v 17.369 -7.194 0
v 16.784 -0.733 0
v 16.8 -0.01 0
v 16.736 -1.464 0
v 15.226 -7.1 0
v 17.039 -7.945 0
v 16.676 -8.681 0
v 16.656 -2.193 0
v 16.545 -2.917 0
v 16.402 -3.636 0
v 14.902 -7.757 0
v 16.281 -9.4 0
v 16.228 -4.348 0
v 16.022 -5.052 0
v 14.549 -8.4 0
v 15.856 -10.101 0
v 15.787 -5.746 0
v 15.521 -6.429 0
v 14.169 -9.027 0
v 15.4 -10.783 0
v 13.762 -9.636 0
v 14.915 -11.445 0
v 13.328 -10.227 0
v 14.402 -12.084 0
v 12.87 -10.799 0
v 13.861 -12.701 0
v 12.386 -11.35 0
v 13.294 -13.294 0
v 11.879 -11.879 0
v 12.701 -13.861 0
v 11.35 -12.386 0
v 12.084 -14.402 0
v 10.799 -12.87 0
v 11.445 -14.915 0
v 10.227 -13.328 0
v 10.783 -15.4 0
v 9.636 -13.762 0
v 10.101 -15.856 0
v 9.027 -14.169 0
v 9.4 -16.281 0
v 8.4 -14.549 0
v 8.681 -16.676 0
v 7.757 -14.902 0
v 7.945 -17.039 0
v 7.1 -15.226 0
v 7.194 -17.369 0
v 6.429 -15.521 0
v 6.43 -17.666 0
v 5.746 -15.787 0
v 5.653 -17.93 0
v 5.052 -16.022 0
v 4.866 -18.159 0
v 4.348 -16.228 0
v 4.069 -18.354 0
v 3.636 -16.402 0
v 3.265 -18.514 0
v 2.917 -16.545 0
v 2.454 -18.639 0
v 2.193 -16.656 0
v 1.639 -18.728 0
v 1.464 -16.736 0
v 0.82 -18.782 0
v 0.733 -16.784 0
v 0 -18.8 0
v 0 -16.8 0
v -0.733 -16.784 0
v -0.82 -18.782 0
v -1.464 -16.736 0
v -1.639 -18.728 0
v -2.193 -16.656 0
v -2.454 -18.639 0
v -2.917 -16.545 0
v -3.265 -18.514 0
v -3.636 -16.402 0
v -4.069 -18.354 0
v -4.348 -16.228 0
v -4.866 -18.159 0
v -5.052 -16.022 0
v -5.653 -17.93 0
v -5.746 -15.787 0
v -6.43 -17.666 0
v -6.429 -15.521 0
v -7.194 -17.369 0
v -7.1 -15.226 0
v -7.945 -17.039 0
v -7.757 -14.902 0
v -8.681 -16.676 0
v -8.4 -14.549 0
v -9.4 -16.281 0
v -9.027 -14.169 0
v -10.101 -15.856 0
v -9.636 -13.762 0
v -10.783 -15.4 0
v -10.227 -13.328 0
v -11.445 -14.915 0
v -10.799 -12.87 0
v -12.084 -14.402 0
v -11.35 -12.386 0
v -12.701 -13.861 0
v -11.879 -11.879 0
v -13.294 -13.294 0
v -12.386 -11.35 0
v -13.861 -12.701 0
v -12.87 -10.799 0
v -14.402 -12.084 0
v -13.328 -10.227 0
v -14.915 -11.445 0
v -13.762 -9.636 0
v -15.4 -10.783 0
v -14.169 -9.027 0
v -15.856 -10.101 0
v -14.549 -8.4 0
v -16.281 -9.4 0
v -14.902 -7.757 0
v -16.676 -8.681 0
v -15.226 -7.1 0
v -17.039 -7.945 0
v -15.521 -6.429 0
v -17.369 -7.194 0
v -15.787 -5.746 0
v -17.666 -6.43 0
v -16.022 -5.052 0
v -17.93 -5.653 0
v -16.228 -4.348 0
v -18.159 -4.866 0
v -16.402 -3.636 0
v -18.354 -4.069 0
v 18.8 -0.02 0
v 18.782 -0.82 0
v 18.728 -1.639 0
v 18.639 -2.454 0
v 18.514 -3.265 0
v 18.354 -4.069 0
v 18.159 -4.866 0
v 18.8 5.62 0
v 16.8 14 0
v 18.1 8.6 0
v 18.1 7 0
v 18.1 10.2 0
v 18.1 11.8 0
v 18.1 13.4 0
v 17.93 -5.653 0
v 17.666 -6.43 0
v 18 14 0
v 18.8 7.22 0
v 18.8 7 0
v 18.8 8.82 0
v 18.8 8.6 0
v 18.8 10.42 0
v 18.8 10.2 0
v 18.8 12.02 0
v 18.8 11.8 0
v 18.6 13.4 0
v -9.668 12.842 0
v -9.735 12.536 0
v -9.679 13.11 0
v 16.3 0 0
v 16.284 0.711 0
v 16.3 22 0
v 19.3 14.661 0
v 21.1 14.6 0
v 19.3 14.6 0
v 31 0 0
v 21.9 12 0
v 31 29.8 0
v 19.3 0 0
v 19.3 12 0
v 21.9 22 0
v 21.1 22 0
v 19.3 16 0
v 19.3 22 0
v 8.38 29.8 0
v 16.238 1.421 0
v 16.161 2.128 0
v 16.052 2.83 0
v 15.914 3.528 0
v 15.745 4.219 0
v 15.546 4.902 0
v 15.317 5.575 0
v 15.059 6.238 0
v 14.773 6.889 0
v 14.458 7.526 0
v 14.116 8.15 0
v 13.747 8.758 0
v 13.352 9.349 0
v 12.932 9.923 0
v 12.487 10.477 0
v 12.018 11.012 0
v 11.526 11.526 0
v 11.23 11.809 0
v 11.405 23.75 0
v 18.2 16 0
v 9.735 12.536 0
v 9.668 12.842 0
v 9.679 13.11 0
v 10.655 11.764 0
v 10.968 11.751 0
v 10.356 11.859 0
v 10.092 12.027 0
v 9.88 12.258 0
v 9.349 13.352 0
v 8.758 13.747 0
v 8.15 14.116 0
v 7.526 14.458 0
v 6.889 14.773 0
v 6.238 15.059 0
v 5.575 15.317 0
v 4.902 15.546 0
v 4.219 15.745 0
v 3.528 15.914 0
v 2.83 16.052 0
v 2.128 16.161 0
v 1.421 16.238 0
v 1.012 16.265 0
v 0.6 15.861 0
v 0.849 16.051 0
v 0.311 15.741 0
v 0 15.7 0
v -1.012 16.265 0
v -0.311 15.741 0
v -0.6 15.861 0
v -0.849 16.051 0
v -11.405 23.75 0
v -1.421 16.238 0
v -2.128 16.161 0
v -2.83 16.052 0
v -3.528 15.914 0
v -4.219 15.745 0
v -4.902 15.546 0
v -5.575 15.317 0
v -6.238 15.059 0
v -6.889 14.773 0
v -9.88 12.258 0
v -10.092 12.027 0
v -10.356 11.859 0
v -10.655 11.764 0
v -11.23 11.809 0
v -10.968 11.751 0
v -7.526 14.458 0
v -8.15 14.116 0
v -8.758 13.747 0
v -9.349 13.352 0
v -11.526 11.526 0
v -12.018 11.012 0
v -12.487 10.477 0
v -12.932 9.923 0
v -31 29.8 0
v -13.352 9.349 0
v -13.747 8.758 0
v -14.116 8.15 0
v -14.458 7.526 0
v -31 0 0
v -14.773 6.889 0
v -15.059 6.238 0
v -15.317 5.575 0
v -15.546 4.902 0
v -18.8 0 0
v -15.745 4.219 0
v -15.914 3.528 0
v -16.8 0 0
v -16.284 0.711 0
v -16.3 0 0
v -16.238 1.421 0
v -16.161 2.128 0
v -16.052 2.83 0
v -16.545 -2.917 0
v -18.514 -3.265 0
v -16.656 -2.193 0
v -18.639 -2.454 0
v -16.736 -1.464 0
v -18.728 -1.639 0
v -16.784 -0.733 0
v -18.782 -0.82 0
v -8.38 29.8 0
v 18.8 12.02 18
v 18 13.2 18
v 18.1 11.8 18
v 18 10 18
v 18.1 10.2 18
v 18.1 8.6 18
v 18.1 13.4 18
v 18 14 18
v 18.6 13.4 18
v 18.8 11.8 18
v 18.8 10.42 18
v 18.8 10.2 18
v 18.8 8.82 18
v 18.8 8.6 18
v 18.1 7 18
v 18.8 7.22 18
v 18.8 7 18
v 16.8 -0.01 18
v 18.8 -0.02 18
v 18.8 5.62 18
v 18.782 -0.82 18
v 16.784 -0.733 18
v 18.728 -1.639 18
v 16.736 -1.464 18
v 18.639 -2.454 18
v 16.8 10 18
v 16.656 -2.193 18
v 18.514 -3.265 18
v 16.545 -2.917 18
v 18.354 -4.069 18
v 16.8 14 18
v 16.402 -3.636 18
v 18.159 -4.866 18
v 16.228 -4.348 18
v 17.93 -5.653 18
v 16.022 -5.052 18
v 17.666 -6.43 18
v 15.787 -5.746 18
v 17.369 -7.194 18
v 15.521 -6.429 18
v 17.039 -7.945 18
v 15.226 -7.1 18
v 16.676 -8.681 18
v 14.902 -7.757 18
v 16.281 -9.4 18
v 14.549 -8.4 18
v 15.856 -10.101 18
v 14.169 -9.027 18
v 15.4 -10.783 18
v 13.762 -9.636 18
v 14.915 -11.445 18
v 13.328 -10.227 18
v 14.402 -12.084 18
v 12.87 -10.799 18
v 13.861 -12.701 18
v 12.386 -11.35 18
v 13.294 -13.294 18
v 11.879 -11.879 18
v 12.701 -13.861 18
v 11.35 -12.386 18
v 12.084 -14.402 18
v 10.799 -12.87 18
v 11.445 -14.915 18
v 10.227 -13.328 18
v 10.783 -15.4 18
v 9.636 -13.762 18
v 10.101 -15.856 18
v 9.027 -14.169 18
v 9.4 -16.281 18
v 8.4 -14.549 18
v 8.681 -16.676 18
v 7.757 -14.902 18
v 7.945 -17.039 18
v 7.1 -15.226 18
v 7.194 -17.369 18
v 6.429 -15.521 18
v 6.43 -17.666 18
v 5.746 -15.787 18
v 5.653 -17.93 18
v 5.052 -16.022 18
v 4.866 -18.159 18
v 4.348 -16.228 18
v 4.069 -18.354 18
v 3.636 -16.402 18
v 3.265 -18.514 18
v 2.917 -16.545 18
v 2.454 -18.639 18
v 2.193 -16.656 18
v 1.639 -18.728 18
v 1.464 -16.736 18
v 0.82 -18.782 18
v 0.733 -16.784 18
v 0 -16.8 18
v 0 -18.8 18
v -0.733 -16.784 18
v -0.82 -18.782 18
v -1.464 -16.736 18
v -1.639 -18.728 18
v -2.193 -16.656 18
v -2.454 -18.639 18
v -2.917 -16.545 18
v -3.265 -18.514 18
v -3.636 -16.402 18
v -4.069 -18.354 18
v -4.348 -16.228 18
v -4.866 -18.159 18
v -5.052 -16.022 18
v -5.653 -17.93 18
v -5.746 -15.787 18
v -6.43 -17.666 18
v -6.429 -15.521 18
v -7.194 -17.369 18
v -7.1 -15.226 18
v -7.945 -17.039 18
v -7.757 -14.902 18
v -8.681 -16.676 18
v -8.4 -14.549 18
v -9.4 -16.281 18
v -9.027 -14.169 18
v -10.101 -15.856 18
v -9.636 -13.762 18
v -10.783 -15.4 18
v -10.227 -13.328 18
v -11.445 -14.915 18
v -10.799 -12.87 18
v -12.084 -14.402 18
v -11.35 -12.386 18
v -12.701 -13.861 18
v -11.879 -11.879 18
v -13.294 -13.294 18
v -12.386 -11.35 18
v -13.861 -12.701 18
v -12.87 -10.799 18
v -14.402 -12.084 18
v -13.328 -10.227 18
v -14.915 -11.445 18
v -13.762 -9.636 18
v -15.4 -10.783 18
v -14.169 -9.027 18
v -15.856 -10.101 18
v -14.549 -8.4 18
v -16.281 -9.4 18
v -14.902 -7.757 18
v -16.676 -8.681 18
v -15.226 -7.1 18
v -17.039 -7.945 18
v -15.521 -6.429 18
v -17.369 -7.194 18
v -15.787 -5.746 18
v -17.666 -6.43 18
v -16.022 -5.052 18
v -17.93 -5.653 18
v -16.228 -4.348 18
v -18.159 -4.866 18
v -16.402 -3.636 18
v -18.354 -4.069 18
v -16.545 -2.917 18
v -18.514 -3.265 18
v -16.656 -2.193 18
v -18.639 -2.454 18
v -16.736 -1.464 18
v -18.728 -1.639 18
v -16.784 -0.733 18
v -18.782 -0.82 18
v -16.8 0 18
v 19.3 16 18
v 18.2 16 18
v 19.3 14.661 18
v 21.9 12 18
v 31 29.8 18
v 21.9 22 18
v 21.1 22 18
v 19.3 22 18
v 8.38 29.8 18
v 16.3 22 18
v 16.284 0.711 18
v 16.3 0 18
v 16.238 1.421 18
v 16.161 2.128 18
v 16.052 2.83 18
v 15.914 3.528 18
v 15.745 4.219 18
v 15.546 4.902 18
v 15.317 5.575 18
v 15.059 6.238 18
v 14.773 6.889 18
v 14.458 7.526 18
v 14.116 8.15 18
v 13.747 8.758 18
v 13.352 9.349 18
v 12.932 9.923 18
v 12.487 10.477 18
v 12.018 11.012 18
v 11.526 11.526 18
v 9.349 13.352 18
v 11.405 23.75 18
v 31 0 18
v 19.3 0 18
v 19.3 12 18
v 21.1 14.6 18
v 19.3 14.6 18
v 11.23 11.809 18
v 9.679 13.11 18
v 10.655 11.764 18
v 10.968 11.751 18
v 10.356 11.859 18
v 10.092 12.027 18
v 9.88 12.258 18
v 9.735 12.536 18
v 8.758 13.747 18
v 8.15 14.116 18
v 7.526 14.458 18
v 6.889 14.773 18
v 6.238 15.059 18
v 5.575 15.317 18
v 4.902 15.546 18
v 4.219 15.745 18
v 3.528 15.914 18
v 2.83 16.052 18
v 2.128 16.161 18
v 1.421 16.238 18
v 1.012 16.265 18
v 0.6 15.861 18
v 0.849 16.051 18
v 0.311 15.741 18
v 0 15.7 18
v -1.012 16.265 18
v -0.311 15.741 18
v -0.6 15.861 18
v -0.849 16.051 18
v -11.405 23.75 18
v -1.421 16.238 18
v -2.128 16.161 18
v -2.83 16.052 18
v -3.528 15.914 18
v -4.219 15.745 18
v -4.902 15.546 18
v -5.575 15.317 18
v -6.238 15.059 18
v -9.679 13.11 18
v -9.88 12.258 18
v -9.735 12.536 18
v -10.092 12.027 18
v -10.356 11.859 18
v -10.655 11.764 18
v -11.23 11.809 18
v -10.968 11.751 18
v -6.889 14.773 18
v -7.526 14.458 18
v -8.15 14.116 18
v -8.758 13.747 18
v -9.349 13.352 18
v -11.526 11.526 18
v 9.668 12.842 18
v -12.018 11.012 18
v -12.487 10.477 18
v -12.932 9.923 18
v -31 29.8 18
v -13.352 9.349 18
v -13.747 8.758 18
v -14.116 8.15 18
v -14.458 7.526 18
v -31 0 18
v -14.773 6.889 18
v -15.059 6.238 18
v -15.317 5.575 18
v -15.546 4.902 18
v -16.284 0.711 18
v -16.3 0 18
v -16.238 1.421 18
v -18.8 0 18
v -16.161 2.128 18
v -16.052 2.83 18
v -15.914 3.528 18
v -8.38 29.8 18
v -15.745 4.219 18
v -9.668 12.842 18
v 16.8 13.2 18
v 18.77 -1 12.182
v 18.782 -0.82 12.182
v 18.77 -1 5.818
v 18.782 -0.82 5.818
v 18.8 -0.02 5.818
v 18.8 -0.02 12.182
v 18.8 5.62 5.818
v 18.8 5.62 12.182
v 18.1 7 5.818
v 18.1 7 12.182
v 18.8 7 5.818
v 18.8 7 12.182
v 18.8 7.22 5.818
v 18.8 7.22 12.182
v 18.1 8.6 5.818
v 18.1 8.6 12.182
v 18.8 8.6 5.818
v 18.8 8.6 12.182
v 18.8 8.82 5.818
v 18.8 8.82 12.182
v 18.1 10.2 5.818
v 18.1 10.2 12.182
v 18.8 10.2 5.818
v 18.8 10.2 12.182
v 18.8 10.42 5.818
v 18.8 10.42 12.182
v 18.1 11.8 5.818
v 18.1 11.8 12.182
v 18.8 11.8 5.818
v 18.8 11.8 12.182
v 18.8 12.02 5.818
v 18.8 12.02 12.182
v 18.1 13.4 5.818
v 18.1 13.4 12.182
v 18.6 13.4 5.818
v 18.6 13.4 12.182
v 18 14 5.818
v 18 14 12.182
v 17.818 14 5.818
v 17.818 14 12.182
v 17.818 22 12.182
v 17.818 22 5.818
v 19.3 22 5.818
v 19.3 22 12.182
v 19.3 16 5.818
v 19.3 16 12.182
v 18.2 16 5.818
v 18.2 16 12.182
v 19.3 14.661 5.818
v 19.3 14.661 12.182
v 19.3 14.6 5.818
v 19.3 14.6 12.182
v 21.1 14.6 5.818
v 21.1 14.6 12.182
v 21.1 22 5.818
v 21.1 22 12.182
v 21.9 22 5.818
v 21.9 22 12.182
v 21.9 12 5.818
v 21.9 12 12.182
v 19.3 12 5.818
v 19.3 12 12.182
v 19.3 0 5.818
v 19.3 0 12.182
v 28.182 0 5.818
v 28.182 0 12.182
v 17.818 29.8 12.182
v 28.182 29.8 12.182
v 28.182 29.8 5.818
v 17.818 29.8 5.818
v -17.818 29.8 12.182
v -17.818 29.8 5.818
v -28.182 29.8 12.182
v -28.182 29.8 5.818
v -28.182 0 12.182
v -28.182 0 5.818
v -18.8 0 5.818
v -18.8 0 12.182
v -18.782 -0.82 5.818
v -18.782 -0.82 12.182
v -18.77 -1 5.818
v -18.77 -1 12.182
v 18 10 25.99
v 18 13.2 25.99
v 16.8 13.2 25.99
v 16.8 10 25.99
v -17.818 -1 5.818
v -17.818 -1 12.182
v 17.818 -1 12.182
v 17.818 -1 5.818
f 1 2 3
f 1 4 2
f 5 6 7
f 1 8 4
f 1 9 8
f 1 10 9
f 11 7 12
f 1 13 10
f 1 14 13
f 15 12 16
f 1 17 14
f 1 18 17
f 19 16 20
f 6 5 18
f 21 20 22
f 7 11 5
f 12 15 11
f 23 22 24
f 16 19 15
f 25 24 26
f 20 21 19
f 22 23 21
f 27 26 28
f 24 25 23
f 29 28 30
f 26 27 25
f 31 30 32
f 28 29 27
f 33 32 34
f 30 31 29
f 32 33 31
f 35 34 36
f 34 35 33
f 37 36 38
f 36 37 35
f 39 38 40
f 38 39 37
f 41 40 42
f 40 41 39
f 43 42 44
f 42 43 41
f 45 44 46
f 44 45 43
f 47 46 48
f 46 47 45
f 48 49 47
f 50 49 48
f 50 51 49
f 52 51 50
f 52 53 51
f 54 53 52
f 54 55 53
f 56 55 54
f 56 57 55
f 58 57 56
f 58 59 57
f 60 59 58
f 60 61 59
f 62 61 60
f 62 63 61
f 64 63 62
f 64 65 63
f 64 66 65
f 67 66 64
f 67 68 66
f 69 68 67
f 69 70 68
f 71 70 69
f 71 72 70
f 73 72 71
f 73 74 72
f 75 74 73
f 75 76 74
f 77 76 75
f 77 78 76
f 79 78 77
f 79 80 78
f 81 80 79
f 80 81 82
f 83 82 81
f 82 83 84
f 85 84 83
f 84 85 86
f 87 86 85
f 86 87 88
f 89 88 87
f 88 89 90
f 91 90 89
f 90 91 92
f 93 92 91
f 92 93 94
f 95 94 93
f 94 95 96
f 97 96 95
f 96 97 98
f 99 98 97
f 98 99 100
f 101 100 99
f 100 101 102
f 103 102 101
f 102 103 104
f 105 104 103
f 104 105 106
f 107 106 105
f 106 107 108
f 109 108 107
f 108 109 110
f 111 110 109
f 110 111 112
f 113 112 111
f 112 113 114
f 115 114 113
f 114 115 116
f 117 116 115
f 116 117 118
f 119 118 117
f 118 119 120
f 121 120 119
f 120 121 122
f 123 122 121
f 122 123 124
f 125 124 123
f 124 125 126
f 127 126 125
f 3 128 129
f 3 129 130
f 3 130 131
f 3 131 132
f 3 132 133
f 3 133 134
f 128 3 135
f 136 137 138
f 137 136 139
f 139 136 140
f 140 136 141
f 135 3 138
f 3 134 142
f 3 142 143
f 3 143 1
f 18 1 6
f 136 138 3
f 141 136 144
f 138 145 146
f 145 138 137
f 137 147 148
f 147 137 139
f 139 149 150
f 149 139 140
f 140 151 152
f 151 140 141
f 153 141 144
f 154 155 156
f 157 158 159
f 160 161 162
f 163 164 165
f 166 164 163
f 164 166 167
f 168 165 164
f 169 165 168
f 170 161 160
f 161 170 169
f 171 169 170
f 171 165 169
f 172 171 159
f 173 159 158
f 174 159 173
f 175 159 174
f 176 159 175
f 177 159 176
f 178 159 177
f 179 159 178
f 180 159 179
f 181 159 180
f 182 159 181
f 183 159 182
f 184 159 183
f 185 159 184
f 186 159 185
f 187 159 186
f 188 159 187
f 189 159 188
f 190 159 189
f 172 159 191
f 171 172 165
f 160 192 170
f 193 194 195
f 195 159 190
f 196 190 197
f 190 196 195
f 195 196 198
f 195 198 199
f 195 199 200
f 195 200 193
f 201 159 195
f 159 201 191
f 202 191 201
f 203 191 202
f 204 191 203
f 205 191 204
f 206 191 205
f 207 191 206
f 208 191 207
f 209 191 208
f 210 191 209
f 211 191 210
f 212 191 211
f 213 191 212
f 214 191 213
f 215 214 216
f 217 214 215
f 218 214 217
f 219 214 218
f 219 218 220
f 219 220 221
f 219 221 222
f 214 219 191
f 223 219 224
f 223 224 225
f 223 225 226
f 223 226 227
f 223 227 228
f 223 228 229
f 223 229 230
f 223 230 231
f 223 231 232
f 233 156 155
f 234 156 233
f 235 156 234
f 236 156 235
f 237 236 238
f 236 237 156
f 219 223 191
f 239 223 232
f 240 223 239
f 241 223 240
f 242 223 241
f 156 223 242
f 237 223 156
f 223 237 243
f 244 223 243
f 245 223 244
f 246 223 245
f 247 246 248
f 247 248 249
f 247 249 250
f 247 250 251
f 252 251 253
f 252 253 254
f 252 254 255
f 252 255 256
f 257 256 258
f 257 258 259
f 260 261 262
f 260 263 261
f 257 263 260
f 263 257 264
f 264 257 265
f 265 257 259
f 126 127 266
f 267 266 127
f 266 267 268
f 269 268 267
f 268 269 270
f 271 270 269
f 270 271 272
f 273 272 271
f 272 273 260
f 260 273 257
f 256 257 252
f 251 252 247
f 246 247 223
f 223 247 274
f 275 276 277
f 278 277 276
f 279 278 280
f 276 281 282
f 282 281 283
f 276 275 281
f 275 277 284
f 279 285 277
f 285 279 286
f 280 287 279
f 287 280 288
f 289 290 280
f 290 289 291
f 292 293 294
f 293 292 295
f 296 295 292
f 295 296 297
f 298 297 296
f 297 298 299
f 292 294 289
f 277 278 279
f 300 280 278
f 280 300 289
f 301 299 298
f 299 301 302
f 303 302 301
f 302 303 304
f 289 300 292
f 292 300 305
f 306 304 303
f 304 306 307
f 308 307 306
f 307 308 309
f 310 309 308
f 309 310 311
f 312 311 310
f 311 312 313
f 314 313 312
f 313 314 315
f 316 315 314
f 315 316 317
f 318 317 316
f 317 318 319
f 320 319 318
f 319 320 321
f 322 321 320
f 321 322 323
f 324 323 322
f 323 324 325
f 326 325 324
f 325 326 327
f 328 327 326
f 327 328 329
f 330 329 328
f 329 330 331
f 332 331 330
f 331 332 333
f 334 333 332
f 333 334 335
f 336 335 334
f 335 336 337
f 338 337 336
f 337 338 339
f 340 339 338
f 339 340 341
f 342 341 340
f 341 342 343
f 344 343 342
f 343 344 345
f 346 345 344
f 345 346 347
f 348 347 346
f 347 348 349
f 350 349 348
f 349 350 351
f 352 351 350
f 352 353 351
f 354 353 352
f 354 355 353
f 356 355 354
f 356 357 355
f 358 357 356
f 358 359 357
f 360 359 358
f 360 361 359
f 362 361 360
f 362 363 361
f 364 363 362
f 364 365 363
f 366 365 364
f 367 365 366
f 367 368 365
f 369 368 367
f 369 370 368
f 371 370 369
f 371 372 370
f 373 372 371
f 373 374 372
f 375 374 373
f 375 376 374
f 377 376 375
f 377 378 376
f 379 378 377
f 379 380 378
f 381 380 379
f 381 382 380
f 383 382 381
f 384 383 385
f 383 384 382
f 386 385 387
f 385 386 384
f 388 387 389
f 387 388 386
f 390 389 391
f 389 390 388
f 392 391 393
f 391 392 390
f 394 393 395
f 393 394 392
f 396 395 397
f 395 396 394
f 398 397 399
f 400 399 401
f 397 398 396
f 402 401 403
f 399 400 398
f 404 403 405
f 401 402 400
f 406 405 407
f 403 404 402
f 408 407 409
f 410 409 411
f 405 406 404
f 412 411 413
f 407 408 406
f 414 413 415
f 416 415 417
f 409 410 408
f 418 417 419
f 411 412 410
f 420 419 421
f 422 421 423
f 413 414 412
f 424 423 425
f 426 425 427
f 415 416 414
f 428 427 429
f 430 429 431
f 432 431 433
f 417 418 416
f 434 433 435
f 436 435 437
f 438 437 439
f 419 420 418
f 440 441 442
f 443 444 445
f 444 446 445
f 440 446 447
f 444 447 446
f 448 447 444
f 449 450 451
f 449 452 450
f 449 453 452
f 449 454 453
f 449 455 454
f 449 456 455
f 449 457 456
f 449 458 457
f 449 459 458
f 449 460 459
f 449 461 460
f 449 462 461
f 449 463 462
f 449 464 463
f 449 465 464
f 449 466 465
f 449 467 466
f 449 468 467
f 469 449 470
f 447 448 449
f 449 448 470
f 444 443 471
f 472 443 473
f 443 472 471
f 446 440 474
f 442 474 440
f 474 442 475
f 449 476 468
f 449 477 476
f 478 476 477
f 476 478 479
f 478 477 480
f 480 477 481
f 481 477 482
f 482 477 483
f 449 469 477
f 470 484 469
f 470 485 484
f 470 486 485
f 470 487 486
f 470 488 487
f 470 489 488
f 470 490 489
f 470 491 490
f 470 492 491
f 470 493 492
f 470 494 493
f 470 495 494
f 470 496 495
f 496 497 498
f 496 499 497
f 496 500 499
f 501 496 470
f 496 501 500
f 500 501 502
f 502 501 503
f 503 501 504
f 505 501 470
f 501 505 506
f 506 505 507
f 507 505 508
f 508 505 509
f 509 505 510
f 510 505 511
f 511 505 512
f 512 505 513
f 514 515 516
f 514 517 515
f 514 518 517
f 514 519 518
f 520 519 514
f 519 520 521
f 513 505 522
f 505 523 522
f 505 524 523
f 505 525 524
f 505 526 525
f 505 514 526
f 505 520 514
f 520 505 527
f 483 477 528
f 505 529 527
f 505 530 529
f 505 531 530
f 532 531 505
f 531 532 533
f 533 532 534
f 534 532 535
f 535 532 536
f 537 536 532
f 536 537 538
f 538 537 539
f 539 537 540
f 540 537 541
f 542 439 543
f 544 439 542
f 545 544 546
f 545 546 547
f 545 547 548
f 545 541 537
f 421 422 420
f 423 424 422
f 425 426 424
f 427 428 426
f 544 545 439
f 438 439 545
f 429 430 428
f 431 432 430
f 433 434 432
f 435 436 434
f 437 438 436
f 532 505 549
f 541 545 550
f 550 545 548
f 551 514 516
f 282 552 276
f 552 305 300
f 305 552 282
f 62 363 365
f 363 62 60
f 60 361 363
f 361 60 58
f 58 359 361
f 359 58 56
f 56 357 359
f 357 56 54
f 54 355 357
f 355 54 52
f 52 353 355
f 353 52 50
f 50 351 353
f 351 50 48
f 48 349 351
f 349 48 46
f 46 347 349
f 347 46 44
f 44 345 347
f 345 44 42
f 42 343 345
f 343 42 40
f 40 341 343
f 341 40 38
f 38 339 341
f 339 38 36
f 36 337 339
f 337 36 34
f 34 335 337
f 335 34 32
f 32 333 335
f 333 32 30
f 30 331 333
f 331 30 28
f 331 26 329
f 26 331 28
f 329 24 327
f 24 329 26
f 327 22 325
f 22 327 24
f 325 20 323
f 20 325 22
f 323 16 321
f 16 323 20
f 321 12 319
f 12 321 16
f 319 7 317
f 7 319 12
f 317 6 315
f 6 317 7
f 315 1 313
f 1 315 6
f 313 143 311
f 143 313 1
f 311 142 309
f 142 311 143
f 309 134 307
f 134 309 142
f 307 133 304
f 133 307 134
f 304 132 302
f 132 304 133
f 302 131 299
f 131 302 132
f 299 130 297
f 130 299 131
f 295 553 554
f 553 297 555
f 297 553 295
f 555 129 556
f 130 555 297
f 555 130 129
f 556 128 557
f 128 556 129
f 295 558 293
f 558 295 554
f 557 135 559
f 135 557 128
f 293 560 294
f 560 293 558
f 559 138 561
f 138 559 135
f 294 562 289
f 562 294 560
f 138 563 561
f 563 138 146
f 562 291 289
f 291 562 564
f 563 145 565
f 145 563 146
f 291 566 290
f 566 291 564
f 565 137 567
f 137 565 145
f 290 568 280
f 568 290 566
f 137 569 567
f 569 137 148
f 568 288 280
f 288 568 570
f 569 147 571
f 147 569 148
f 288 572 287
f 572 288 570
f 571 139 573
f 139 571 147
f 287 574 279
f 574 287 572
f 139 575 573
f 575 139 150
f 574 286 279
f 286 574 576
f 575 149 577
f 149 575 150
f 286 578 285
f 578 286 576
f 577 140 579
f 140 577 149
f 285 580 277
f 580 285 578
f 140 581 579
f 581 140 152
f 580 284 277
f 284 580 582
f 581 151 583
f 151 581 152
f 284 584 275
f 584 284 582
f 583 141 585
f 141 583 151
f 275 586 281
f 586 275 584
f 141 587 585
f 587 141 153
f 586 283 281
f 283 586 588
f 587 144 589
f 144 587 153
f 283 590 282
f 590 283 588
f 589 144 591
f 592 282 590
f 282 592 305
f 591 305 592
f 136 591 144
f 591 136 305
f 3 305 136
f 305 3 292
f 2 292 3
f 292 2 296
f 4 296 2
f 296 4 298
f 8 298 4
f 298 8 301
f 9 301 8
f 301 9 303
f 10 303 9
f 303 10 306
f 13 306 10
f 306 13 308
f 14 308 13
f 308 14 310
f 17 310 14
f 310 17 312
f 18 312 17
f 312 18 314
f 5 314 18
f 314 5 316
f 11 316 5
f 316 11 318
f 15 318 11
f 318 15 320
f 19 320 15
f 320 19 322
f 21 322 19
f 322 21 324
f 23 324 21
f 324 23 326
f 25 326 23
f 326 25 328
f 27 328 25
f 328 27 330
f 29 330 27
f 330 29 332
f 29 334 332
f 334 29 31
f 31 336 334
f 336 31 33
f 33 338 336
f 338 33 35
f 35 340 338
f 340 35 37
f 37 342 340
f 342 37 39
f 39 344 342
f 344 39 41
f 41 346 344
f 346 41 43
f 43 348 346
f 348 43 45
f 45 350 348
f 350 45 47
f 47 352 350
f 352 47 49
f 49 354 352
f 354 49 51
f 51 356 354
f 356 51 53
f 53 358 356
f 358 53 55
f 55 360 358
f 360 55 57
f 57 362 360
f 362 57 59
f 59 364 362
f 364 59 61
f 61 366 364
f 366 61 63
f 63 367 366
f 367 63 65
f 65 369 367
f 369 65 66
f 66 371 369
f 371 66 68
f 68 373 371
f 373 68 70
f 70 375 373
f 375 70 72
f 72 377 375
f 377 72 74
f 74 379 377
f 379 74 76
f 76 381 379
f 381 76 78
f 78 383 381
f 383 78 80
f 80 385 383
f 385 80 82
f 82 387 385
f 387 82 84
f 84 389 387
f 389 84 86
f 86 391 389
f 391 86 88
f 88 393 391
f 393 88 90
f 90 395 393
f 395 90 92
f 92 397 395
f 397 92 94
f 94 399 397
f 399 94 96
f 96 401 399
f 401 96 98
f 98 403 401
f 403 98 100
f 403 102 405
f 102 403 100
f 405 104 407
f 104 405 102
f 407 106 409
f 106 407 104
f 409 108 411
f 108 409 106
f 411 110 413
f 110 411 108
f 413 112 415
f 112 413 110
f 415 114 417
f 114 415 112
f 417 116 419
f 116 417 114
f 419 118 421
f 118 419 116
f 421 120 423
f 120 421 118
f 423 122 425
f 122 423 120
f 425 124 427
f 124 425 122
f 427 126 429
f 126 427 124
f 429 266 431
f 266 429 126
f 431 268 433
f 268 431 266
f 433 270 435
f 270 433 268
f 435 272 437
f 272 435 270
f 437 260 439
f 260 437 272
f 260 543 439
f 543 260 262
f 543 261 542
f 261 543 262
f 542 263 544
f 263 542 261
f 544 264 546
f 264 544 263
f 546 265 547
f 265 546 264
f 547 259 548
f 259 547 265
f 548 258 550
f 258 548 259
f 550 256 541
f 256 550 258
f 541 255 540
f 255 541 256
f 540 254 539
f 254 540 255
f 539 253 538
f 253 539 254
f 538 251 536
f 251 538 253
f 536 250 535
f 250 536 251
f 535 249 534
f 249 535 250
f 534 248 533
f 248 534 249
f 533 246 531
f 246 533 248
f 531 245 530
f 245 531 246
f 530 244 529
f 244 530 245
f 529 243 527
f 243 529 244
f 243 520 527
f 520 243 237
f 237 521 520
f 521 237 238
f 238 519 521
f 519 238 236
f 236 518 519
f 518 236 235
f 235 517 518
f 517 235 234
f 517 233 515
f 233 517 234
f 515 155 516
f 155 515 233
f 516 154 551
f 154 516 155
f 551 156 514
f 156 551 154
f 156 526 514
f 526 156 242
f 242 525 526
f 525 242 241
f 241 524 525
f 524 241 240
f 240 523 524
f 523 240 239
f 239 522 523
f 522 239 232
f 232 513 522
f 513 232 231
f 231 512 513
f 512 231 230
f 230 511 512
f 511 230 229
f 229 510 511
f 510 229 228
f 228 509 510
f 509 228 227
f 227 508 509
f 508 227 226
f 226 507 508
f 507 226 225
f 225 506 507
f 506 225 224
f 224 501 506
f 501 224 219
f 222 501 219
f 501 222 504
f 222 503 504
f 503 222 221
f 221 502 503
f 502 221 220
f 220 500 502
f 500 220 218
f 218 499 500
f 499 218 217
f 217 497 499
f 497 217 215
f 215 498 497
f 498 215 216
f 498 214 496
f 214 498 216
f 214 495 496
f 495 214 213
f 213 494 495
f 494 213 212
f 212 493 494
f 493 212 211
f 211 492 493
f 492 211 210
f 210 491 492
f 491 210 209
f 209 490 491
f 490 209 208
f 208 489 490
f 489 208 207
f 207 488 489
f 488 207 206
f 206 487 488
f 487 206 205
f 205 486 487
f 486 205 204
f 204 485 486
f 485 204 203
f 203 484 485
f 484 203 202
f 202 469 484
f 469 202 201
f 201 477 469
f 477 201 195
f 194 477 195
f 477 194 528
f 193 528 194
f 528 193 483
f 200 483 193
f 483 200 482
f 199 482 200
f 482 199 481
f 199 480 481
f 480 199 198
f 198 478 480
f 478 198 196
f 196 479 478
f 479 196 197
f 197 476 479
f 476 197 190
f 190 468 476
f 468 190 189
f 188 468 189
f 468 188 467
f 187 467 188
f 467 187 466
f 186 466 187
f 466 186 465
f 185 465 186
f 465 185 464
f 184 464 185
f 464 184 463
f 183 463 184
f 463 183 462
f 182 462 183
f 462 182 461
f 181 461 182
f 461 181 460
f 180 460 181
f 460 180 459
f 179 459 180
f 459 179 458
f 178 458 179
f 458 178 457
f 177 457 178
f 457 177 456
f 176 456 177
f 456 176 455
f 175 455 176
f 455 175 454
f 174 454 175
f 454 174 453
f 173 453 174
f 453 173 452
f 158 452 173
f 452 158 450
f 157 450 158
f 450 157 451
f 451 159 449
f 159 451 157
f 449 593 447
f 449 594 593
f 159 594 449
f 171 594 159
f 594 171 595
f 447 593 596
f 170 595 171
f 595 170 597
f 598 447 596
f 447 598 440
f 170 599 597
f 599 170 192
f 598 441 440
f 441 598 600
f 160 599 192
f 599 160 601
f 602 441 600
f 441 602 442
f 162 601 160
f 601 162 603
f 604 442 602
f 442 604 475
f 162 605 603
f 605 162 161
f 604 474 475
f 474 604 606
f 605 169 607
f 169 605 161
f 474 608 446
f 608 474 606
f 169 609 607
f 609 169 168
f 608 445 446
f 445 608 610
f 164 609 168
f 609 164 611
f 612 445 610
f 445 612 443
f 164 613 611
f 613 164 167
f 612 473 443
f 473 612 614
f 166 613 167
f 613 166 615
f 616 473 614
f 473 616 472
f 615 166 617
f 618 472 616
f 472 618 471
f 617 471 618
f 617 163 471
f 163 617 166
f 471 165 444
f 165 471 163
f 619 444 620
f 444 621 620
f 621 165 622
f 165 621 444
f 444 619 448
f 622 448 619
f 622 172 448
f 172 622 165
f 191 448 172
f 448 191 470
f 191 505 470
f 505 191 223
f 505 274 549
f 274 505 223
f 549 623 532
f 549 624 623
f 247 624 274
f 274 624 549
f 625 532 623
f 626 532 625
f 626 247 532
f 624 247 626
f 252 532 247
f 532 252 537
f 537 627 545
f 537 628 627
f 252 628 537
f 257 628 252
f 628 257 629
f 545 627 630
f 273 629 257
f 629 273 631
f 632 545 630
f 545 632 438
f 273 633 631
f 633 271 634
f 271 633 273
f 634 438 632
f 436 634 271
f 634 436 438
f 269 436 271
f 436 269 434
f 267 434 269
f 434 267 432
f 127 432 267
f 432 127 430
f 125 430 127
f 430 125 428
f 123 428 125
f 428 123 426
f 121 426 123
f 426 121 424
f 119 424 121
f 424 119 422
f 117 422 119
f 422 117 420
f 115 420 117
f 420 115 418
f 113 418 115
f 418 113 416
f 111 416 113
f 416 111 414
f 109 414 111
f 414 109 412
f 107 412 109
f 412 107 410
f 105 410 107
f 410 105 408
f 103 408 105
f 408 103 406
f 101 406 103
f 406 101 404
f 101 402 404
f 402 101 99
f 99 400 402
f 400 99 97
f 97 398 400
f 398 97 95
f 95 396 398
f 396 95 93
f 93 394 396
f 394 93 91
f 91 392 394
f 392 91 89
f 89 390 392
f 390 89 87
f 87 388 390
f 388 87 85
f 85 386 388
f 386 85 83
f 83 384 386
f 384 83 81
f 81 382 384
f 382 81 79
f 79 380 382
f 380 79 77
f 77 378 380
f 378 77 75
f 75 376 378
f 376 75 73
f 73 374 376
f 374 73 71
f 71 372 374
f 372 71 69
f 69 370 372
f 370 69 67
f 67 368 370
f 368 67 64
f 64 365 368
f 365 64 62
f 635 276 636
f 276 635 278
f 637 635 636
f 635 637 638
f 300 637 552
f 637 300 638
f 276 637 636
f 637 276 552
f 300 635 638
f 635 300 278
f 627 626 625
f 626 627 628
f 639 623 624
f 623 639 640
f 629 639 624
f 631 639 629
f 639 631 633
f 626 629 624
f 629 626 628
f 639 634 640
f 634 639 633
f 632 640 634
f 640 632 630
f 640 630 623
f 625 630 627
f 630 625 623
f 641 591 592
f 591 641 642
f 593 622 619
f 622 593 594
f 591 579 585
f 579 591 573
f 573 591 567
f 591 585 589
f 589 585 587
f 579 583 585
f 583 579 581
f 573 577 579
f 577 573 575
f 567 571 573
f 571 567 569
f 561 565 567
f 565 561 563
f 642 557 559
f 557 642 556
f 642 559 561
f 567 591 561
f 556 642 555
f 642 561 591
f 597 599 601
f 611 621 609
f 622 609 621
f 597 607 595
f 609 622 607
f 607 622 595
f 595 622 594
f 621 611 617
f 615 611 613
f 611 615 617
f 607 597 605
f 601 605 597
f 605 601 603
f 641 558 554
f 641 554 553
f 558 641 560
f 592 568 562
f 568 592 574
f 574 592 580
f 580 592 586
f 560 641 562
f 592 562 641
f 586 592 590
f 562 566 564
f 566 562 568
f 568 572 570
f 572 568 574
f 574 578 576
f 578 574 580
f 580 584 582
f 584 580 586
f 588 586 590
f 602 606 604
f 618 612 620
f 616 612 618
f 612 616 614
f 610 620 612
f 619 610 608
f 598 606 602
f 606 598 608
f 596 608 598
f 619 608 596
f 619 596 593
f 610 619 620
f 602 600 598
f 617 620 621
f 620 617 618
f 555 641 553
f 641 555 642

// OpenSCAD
// file: common.scad
// Shared dimensions in mm; FDM fit allowances are design choices, not tolerances
// guaranteed by vendors. Exact mower model/serial and printer remain unknown.
// 76.2 x 38.1 rectangular rail is an UNVERIFIED selected envelope, not a
// specification for all TimeCutters (Toro also sells C-channel frames).
$fn = 64;
frame_rail_w = 76.2;                // depth wrapped by square U-bolt
frame_rail_h = 38.1;                // contact face width between U-bolt legs
frame_ubolt_inside_w = 40;
frame_ubolt_leg_nominal_d = 8;
frame_ubolt_center_pitch = frame_ubolt_inside_w + frame_ubolt_leg_nominal_d;
frame_ubolt_leg_hole_d = 9;
frame_ubolt_backing_t = 3;
frame_ubolt_washer_t = 2.4;
frame_ubolt_nut_h = 8;
frame_ubolt_thread_projection = 3;  // beyond full nut, not a second nut engagement
// Four-bolt printed steering-bar clamp. The bar size is set by the sleeve set below, so nothing
// here needs a caliper reading; see clamp_bar_od_mm.
clamp_tube_clearance_mm = 0.4;
clamp_shell_mm = 10;
clamp_bolt_x_mm = 18;
clamp_bolt_clear_mm = 5.5;          // four M5 clamp bolts
clamp_nut_af_mm = 8.2;
clamp_nut_depth_mm = 4.8;
clamp_pin_bore_mm = 6.6;
clamp_rod_eye_length_mm = 32;
clamp_rod_eye_width_mm = 20;
clamp_rod_eye_t_mm = 8;             // printed single-eye lug thickness
clamp_rod_gap_mm = 9;               // yoke clearance around the eye, nominally 0.5 mm per side
clamp_yoke_span_mm = 42;            // ear width clears the eye through its planar sweep
clamp_yoke_reach_mm = 42;           // total outboard yoke extension from the clamp body
clamp_yoke_root_overlap_mm = 4;     // fuse each printed ear into its half beyond the bar opening
clamp_yoke_sweep_clearance_mm = 1;
// ---- One clamp body, a SET of sleeves: choose the size by trial, not by calipers ----------
// The bore is FIXED (clamp_body_bore_mm) and every sleeve is turned to that one OD, so the body,
// bolts, yoke and pin are printed once per side and never depend on the bar. Which bar the clamp
// takes is set by which sleeve is fitted; the set below spans the plausible range for a mower
// lever, and each sleeve doubles as its own coupon - the bore is a slip fit over that bar OD - so
// the size is chosen by trying them on the bar. Nothing has to be measured. A bar that falls
// between entries needs one more sleeve printed from this list, and the wall assert refuses an
// entry so close to the fixed bore that the sleeve would be too thin to clamp.
clamp_bar_od_mm = [20, 22.2, 25.4, 28.6, 30];   // 13/16 to 1-3/16 in; extend as needed
function clamp_insert_count() = len(clamp_bar_od_mm);
function clamp_insert_bar_mm(index) = clamp_bar_od_mm[index];
function clamp_insert_bore_mm(index) = clamp_bar_od_mm[index] + clamp_tube_clearance_mm;
clamp_insert_clearance_mm = 0.3;    // sleeve OD to clamp bore, per side
clamp_insert_flange_t_mm = 2.5;     // end flange thickness; bears on the clamp end faces
clamp_insert_flange_grip_mm = 2.2;  // flange radial grip beyond the sleeve OD
clamp_insert_protrusion_mm = 3;     // sleeve tube projects past the body's end faces
clamp_insert_flange_gap_mm = 0.1;   // flange to body end face: retention with just fit clearance
// The clamp bore fits the largest sleeve plus clearance; the BAR never touches the body.
clamp_body_bore_mm = 36.4;
clamp_insert_od_mm = clamp_body_bore_mm - 2*clamp_insert_clearance_mm;
function clamp_insert_wall_at_mm(index) = (clamp_insert_od_mm-clamp_insert_bore_mm(index))/2;
function clamp_insert_flange_od_mm(index) = clamp_insert_od_mm + 2*clamp_insert_flange_grip_mm;
clamp_r_mm = clamp_body_bore_mm / 2;
clamp_half_h_mm = clamp_r_mm + clamp_shell_mm;
clamp_bolt_y_mm = clamp_r_mm + 7;
clamp_w_mm = 2 * (clamp_bolt_y_mm + clamp_shell_mm);
clamp_l_mm = 2 * (clamp_bolt_x_mm + 7);

function clamp_rod_eye_sweep_radius_mm() =
    sqrt(pow(clamp_rod_eye_length_mm/2, 2) + pow(clamp_rod_eye_width_mm/2, 2));

// Photo aa8b43: narrow stationary SIX-hole rear bracket, origin at rear opening.
// Y spans the bracket; Z is up. Photo-derived centres, NOT factory tolerances or
// measured threads. Selected M2.5 through-bolts require real steel nuts/washers.
servo_mount_bolt_d_mm = 2.5;
servo_mount_clear_d_mm = 2.9;
servo_mount_washer_od_mm = 6;        // selected M2.5 washer capacity; check actual hardware
servo_mount_washer_t_mm = 1;
servo_mount_nut_af_mm = 5;
servo_mount_nut_h_mm = 2.5;
servo_mount_tool_d_mm = 8;           // selected slim socket envelope, check actual tool
servo_rear_clearance_d_mm = 13.5;    // capacity for photo opening estimate 12 +/- 1.5
function servo_rear_hole_points_mm() =
    [[-10,18.5],[10,18.5],[-8,8],[8,8],[-8,-7.5],[8,-7.5]];
// Cutter-centre travel +/-0.4 in each axis; M2.5 shank centres can reach +/-0.6
// with diametral clearance. Preserves bore-side web; not full photo uncertainty.
function servo_rear_hole_travel_mm(index) = [0.8,0.8];
// Full-X rounded rectangular slots; h is the complete required passage length.
module servo_rear_hole_cut(h) {
    for(i=[0:len(servo_rear_hole_points_mm())-1]) {
        p = servo_rear_hole_points_mm()[i];
        travel = servo_rear_hole_travel_mm(i);
        hull() for(y=[-travel[0]/2,travel[0]/2],z=[-travel[1]/2,travel[1]/2])
            translate([0,p[0]+y,p[1]+z]) rotate([0,90,0])
                cylinder(d=servo_mount_clear_d_mm,h=h);
    }
}
module servo_rear_opening_cut(h) {
    rotate([0,90,0]) cylinder(d=servo_rear_clearance_d_mm,h=h);
}
m3_clear = 3.4;
m4_clear = 4.5;
m5_clear = 5.5;
m6_clear = 6.4;
m8_clear = 8.4;
wall = 5;
clearance = 0.4;

function frame_ubolt_required_leg_length(saddle_t) =
    frame_rail_w + saddle_t + frame_ubolt_backing_t + frame_ubolt_washer_t +
    frame_ubolt_nut_h + frame_ubolt_thread_projection;
function saddle_width(pitch, bore) = pitch + bore + 2 * wall;


module slot(d, len, h) {
    hull() for (x = [-len / 2, len / 2]) translate([x, 0, 0]) cylinder(h = h, d = d);
}
module plate(l, w, t, r = 6) {
    assert(l >= 2 * r && w >= 2 * r && t > 0);
    hull() for (x = [-1, 1], y = [-1, 1])
        translate([x * (l / 2 - r), y * (w / 2 - r), 0]) cylinder(h = t, r = r);
}
module frame_saddle(l, t, span, leg = frame_ubolt_leg_hole_d) {
    assert(l / 2 - span / 2 - leg / 2 >= 5, "U-bolt hole too near saddle end");
    plate(l, saddle_width(frame_ubolt_center_pitch, leg), t, 8);
}
module frame_ubolt_slots(t, span, leg = frame_ubolt_leg_hole_d) {
    for (x = [-1, 1], y = [-1, 1])
        translate([x * span / 2, y * frame_ubolt_center_pitch / 2, -1]) cylinder(h = t + 2, d = leg);
}
// main file
// HaLow antenna ports and mounts on the enclosure LID's back (-Y) edge: two purchased Rokland
// 10 dBi "Backcountry" 915 MHz omnis, one per HaLow radio (-X station: Alta, +X station: Pi 5).
// The body is unchanged; enclosure_lid.scad carries the ports and post sockets.
// PROTOTYPE GEOMETRY: no ingress (IP), wind, vibration, UV or load rating is claimed.
//
// Antenna: N-male base, 45 in = 1143 mm tall, fibreglass radome, aluminium base tube, two
// U-bolts + bracket supplied:
// https://store.rokland.com/products/10-dbi-backcountry-n-male-omni-outdoor-helium-915-mhz-antenna-48-for-rak-miner-2-nebra-indoor-bobcat-hotspots
// Base-tube diameter, length and mass are NOT published: the grips print to the MEASURED tube
// diameter (ant_tube_d_mm, design range 25-40).
//
// PORT: the lid plate (lid_thickness = 5) is the bulkhead panel, inside the cord-seal line and
// over the box interior. An N-female-to-U.FL bulkhead passes a D-flat hole; its flange/nut and
// O-ring seat on the lid's flat top (the printed bed face) and its nut/shoulder on the flat
// inner face, where the HEAD ribs are cut back within ant_rib_clear_r for spanner room. The
// jack and pigtail hang straight into the box. Nothing printed stands within 10 mm of the
// flange, so the lid top holds no ring of water round the joint; tape the N joint.
//
// MOUNT: the connector carries the antenna's weight only. A separately printed post stands
// inboard (+Y) of each antenna. Its spigot drops into a blind socket in a boss under the lid
// and a flexure snap clicks under a recess in the socket wall (bolt-free; pinch the tab to
// release). Two band grips per antenna (centres 66 mm apart) slide down the post's dovetail
// rails onto ledges and clamp the base tube concentric with the bulkhead axis.
// Load path: antenna -> grips -> post rails -> post column -> column foot bearing on the lid top
// + spigot bearing in the socket boss -> lid plate -> 12 x M4 -> body flange.
// U-bolt FALLBACK: horizontal slots through the post and grips take the supplied U-bolts.
//
// Frames: BODY coordinates with the lid CLOSED (z = 0 body floor bottom, +Y forward). Station
// frame: origin on the antenna axis at the lid top, +Y toward the post; the -X station is the
// mirror image of the +X station.
include <enclosure_common.scad>

antenna_part = "grip";   // grip | post | keepout
post_side = 1;           // post print: +1 = +X (Pi) station, -1 = -X (Alta) station, mirrored
ant_tube_d_mm = 32;      // TO MEASURE: antenna base-tube OD; photo estimate 30-35 (brief)

// ---- Bulkhead (Amphenol Type N catalog, https://www.farnell.com/datasheets/1931349.pdf and
// bulkhead page https://www.farnell.com/datasheets/269482.pdf; purchased pigtail TO MEASURE) ----
ant_dhole_d = 16.3;           // catalog "U" D-flat hole Ø.641 (pairing hole vs body: EST)
ant_dhole_flat = 13.9;        // catalog flats .546 (EST pairing)
ant_panel_t = lid_thickness;  // the lid plate is the panel; 82-369 accepts <= 5.3
ant_nut_af = 19.1;            // catalog hex nut .750 A/F
ant_nut_t = 6;                // DESIGN CAPACITY nut + lock washer (thickness TO MEASURE)
ant_thread_d = 15.9;          // 5/8-24 UNEF coupling/body thread (catalog)
ant_top_d = 23;               // ESTIMATE: flange (82-369: 20.6) or nut + washer on the lid top
ant_top_t = 5;                // ESTIMATE
ant_jack_above = 18;          // ESTIMATE: lid top to the N mating face
ant_jack_below = 14.5;        // ESTIMATE: lid inner face to the cable exit
ant_cable_d = 3;              // envelope round the 1.13 mm cable (generic pigtail, BoardResearch)
ant_cable_bend_r = 6;         // ESTIMATE ~5 x OD; minimum bend radius not published

// ---- Placement ----
ant_ax = 64.5;                // stations at +-ant_ax: 129 mm apart, 0.39 wavelength at 915 MHz
ant_ay = -48;                 // nut/jack inside the -Y inner wall; hole inside the seal line
ant_rib_clear_r = 20;         // HEAD lid ribs cut back round each bulkhead (nut spanner)
ant_keepout_d = 30;           // under-lid station envelope agreed with control_77603
ant_keepout_z0 = 162;
function ant_lid_top() = box_top + lid_thickness;

// ---- Antenna reference (ESTIMATES except the 1143 mm height) ----
ant_height = 1143;            // vendor: 45 in
ant_coupling_d = 22;          // ESTIMATE N-male coupling nut
ant_coupling_len = 20;        // ESTIMATE
ant_tube_len = 100;           // PHOTO ESTIMATE ~100 (brief); TO MEASURE
ant_radome_d = 30;            // ESTIMATE; clearance probes use ant_env_d
ant_env_d = 40;               // clearance envelope = largest tube in range
function ant_mate_z() = ant_jack_above;                  // station frame
function ant_base_z() = ant_mate_z() - 12;               // coupling nut bottom (ESTIMATE)
function ant_tube_z0() = ant_base_z() + ant_coupling_len;
function ant_top_z() = ant_base_z() + ant_height;

// ---- Post, rails, grips (station frame) ----
grip_h = 18;
grip_z = [36, 102];           // grip bottoms above the lid top; centres 66 mm apart
grip_rail_y = 30;             // post face, from the axis toward the post
grip_rail_tip_y = 24;         // dovetail tip
grip_rail_root_hw = 8;
grip_rail_tip_hw = 11;
grip_slide_clear = 0.25;
grip_half_w = 31;
grip_back_clear = 0.2;
grip_rib_crush = 0.3;         // crush-rib interference on the measured tube
grip_band_clear = 0.8;        // band loop radial clearance for axial insertion
grip_cradle_clear = 0.3;      // cradle bore over the tube; the ribs set the centre
grip_band_t = 2;
grip_tail_end_y = 14;
grip_tail_slot_top = 22;
grip_tab_h = 8;               // pull tab above the grip
grip_ledge_h = 6;
post_half_w = 31;
post_back_y = 46;             // column y 30..46; the back face is the print bed face
post_top = grip_z[1] + grip_h;
ubolt_leg_d = 9;              // DESIGN: takes M8 (and smaller) legs; TO MEASURE
ubolt_dx = [18, 25];          // leg offset range from the axis
// Spigot and socket: the spigot sits under the column's inboard part so its boss stays 2 mm
// inside the box's inner wall.
spig_x = [-28.8, 13.8];
spig_y = [34, post_back_y];
spig_d = 16;
sock_clear = 0.2;
sock_extra = 0.5;             // socket deeper than the spigot
sock_floor = 3;
boss_wall = 4;
// Snap: a leaf on the spigot's inboard face, rooted at the spigot tip, with a tab above the
// lid top. Its tooth (square top, 45-degree lead-in) clicks into a recess in the socket wall.
snap_leaf_t = 1.8;
snap_slit = 1.8;
snap_root_z = -13;
snap_tab_z = [2, 10];
snap_tooth = 1.0;
snap_tooth_top = -6.0;
snap_recess_d = 1.4;
snap_recess_z = [-10.2, -5.8];

function grip_r(d = ant_tube_d_mm) = d / 2;
function grip_rb(d = ant_tube_d_mm) = d / 2 + grip_band_clear;
function sock_x() = [spig_x[0] - sock_clear, spig_x[1] + sock_clear];
function sock_y() = [spig_y[0] - sock_clear, spig_y[1] + sock_clear];
function sock_z0() = -(spig_d + sock_extra);
function boss_x() = [sock_x()[0] - boss_wall, sock_x()[1] + boss_wall];
function boss_y() = [sock_y()[0] - 3.8, sock_y()[1] + 3.8];
function boss_z0() = sock_z0() - sock_floor;

assert(ant_tube_d_mm >= 25 && ant_tube_d_mm <= 40, "Grip range is 25-40 mm base tube");
assert(ant_panel_t <= 5.3, "Lid exceeds the 82-369 bulkhead's 5.3 mm maximum panel");
assert(ant_ax + ant_keepout_d / 2 <= box_inner_l / 2 - 2
       && ant_ay - ant_keepout_d / 2 >= -box_inner_w / 2 + 1,
       "Bulkhead station must hang inside the box's inner walls");
assert(ant_ax + boss_x()[1] <= box_inner_l / 2 - 2 && ant_ax + boss_x()[0] >= 0,
       "Socket boss must stay 2 mm inside the inner wall");
assert(boss_y()[0] > ant_keepout_d / 2, "Socket boss runs into the bulkhead station");
assert(ant_lid_top() + boss_z0() >= 170, "Socket boss hangs below z 170 (control_77603 reservation)");
assert(grip_rail_tip_y - 1 - grip_slide_clear > grip_r(40), "40 mm tube leaves no cradle wall");
assert(ubolt_dx[0] - ubolt_leg_d / 2 > grip_rail_tip_hw + 2, "U-bolt slot cuts the rail");
assert(ubolt_dx[1] + ubolt_leg_d / 2 <= min(grip_half_w, post_half_w) - 1.5,
       "U-bolt slot breaks out of the grip or post side");
assert(grip_z[0] > ant_tube_z0() && grip_z[1] + grip_h < ant_tube_z0() + ant_tube_len,
       "Grips must sit on the estimated base tube");
assert(grip_z[1] - grip_ledge_h - 9 - (grip_z[0] + grip_h) >= grip_h + 4,
       "Lower grip cannot be fitted through the gap under the upper ledge");
assert(snap_slit > snap_tooth + sock_clear, "Snap leaf cannot deflect clear of the socket wall");
assert(ant_lid_top() - ant_panel_t - ant_jack_below - ant_cable_bend_r - ant_cable_d / 2
       >= ant_keepout_z0, "Pigtail bend drops below the station floor");

// Accessors (`use` shares functions, never variables).
function ant_axis_xy(side) = [side * ant_ax, ant_ay];
function ant_lid_top_z() = ant_lid_top();
function ant_top_z_mm() = ant_lid_top() + ant_top_z();
function ant_insert_shift_mm() = (grip_rib_crush / sin(50) + grip_band_clear) / 2;
function ant_post_lift_mm() = snap_recess_z[1] - snap_tooth_top + 0.3;
function ant_snap_deflect_mm() = snap_tooth + sock_clear;
function ant_snap_free_z() = snap_root_z + 0.5;   // leaf free above its root block
function ant_top_d_mm() = ant_top_d;
function ant_top_t_mm() = ant_top_t;

module ant_mirror(side) { if (side < 0) mirror([1, 0, 0]) children(); else children(); }
// Station frame -> body coordinates (mirrored for the -X station).
module at_station(side) {
    translate([side * ant_ax, ant_ay, ant_lid_top()]) ant_mirror(side) children();
}
module box3(a, b) { translate(a) cube(b - a); }

// ---- Lid features (body coordinates, lid closed); enclosure_lid.scad maps them ----
module antenna_socket_boss(side) {
    at_station(side) box3([boss_x()[0], boss_y()[0], boss_z0()],
                          [boss_x()[1], boss_y()[1], -lid_thickness + 0.01]);
}
module antenna_lid_add() { for (s = [-1, 1]) antenna_socket_boss(s); }
module antenna_lid_rib_clear() {
    for (s = [-1, 1]) translate([s * ant_ax, ant_ay, box_top - 9])
        cylinder(r = ant_rib_clear_r, h = 9, $fn = 72);
}
module ant_snap_recess() {
    // In the socket's inboard wall; its bottom is a 45-degree chamfer (a print ceiling).
    x0 = sock_x()[0];
    translate([0, sock_y()[1], 0]) rotate([90, 0, 0])
        linear_extrude(height = sock_y()[1] - sock_y()[0])
            polygon([[x0 + 0.01, snap_recess_z[1]], [x0 - snap_recess_d, snap_recess_z[1]],
                     [x0 - snap_recess_d, snap_recess_z[0] + snap_recess_d],
                     [x0 + 0.01, snap_recess_z[0]]]);
}
module antenna_lid_cut() {
    for (s = [-1, 1]) at_station(s) {
        // D-flat bulkhead hole through the plate.
        translate([0, 0, -ant_panel_t - 1]) intersection() {
            cylinder(d = ant_dhole_d, h = ant_panel_t + 2, $fn = 64);
            translate([-ant_dhole_d, -ant_dhole_flat / 2, 0])
                cube([2 * ant_dhole_d, ant_dhole_flat, ant_panel_t + 2]);
        }
        // Blind post socket and its snap recess.
        box3([sock_x()[0], sock_y()[0], sock_z0()], [sock_x()[1], sock_y()[1], 1]);
        ant_snap_recess();
    }
}
// Under-lid envelope agreed with control_77603: jack, nut, pigtail bend and the socket boss.
module antenna_lid_keepout() {
    for (s = [-1, 1]) {
        translate([s * ant_ax, ant_ay, ant_keepout_z0])
            cylinder(d = ant_keepout_d, h = box_top - ant_keepout_z0, $fn = 72);
        antenna_socket_boss(s);
    }
}

// ---- Post (station frame; printed lying on its back face, see antenna_post_print) ----
module ant_rail_profile() {
    polygon([[-grip_rail_root_hw, grip_rail_y + 1], [grip_rail_root_hw, grip_rail_y + 1],
             [grip_rail_root_hw, grip_rail_y], [grip_rail_tip_hw, grip_rail_tip_y],
             [-grip_rail_tip_hw, grip_rail_tip_y], [-grip_rail_root_hw, grip_rail_y]]);
}
module ant_ledge(z_top) {
    // Shelf under a rail segment; its underside is a 45-degree corbel back to the post face.
    hull() {
        translate([-14, grip_rail_tip_y, z_top - grip_ledge_h])
            cube([28, grip_rail_y - grip_rail_tip_y + 1, grip_ledge_h]);
        translate([-14, grip_rail_y, z_top - grip_ledge_h - (grip_rail_y - grip_rail_tip_y) - 3])
            cube([28, 1, 1]);
    }
}
function snap_x() = spig_x[0];
module antenna_post_core() {
    xs = snap_x() + snap_leaf_t + snap_slit;          // core starts past the leaf and slit
    difference() {
        union() {
            box3([-post_half_w, grip_rail_y, 0], [post_half_w, post_back_y, post_top]);
            for (z = grip_z) {
                translate([0, 0, z]) linear_extrude(height = grip_h) ant_rail_profile();
                ant_ledge(z);
            }
        }
        // Notch round the snap tab at the column root.
        box3([-post_half_w - 1, spig_y[0] - 1, -1], [xs, post_back_y + 1, snap_tab_z[1] + 2]);
        // U-bolt FALLBACK leg slots through the column (diamond: prints without support).
        for (z = grip_z, s = [-1, 1]) hull() for (dx = ubolt_dx)
            translate([s * dx, grip_rail_tip_y - 1, z + grip_h / 2]) rotate([-90, 0, 0])
                rotate([0, 0, 45]) cylinder(d = ubolt_leg_d, h = post_back_y - grip_rail_tip_y + 2, $fn = 4);
    }
    // Spigot core (past the slit) and the root block that carries the leaf.
    box3([xs, spig_y[0], -spig_d], [spig_x[1], spig_y[1], 0.01]);
    box3([spig_x[0], spig_y[0], -spig_d], [spig_x[1], spig_y[1], snap_root_z + 0.01]);
}
module antenna_post_snap() {
    // Leaf, tooth and finger tab: one piece with the core through the root block.
    box3([snap_x(), spig_y[0], snap_root_z], [snap_x() + snap_leaf_t, spig_y[1], snap_tab_z[1]]);
    translate([0, spig_y[1], 0]) rotate([90, 0, 0]) linear_extrude(height = spig_y[1] - spig_y[0])
        polygon([[snap_x() + 0.01, snap_tooth_top - snap_tooth - 2.4],
                 [snap_x() - snap_tooth, snap_tooth_top - 2.4],
                 [snap_x() - snap_tooth, snap_tooth_top], [snap_x() + 0.01, snap_tooth_top]]);
    box3([-post_half_w - 0.5, spig_y[0], snap_tab_z[0]], [snap_x() + 0.01, spig_y[1], snap_tab_z[1]]);
}
module antenna_post_local() { antenna_post_core(); antenna_post_snap(); }
module antenna_post_placed(side) { at_station(side) antenna_post_local(); }
// Print pose: back face (y = post_back_y) on the bed, column axis along +Y.
module antenna_post_print(side = post_side) {
    translate([0, spig_d, post_back_y]) rotate([-90, 0, 0]) ant_mirror(side) antenna_post_local();
}

// ---- Grip (printed upright, bottom face on the bed; one body; same part at both stations) ----
// Local frame: origin on the antenna axis, +Y toward the post, z = 0 the grip bottom.
module grip_profile(d = ant_tube_d_mm) {
    r = grip_r(d);
    rb = grip_rb(d);
    t = grip_band_t;
    xo = rb + t;                               // tail outer face
    yb = grip_rail_y - grip_back_clear;
    // Cradle block with the dovetail slot, tail slot and pawl relief.
    difference() {
        translate([-grip_half_w, 0]) square([2 * grip_half_w, yb]);
        circle(r = r + grip_cradle_clear, $fn = 144);
        offset(delta = grip_slide_clear) ant_rail_profile();
        translate([rb - 0.5, -1]) square([t + 1, grip_tail_slot_top + 1]);
        translate([xo + 2.3, grip_tail_end_y - 2]) square([0.8, grip_tail_slot_top - grip_tail_end_y + 2]);
        translate([xo + 0.5, grip_tail_end_y - 2]) square([2.6, 2.6]);
    }
    // Crush ribs inside the cradle (interfere grip_rib_crush with the measured tube).
    for (a = [50, 90, 130]) rotate(a) translate([r + 1.2 - grip_rib_crush, 0]) circle(r = 1.2, $fn = 24);
    // Pawl tooth on the flexure: square top face blocks loosening, ramped underside lets the
    // tail pass when pulled tight.
    polygon([[xo + 0.55, grip_tail_end_y + 0.6], [xo - 0.6, grip_tail_end_y + 2.0],
             [xo + 0.55, grip_tail_end_y + 2.0]]);
    // Band loop (root fused on the -X side), and the ratchet tail.
    difference() {
        circle(r = rb + t, $fn = 144);
        circle(r = rb, $fn = 144);
        translate([-rb - t - 1, sin(5) * rb]) square([2 * (rb + t) + 2, rb + t + 1]);
        translate([0, -0.01]) square([rb + t + 1, rb + t + 1]);
    }
    difference() {
        polygon([[rb, -0.02], [xo, -0.02], [xo, grip_tail_end_y - 0.8],
                 [xo - 0.8, grip_tail_end_y], [rb, grip_tail_end_y]]);
        for (k = [1:5]) let(y0 = grip_tail_end_y - 1.6 * k - 0.4)
            polygon([[xo + 0.01, y0], [xo - 0.7, y0 + 1.4], [xo + 0.01, y0 + 1.4]]);
    }
}
module antenna_grip(d = ant_tube_d_mm) {
    rb = grip_rb(d);
    difference() {
        union() {
            linear_extrude(height = grip_h) grip_profile(d);
            // Pull tab on the tail end, standing above the grip.
            translate([rb, grip_tail_end_y - 4, grip_h - 0.01])
                cube([grip_band_t - 0.8, 3.2, grip_tab_h]);
        }
        // U-bolt FALLBACK leg slots, matching the post (diamond: prints without support).
        for (s = [-1, 1]) hull() for (dx = [max(ubolt_dx[0], grip_r(d) + ubolt_leg_d / 2 + 0.5), ubolt_dx[1]])
            translate([s * dx, -1, grip_h / 2]) rotate([-90, 0, 0]) rotate([0, 0, 45])
                cylinder(d = ubolt_leg_d, h = grip_rail_y + 2, $fn = 4);
    }
}
// Grip i (0 lower, 1 upper) of a station, installed (never mirrored: the rail is symmetric).
module antenna_grip_placed(i, side, d = ant_tube_d_mm) {
    translate([side * ant_ax, ant_ay, ant_lid_top() + grip_z[i]]) antenna_grip(d);
}

// ---- References (body coordinates) ----
module antenna_bulkhead_top_ref(side) {
    // Flange or nut + washer and O-ring on the lid top, and the N-female interface.
    at_station(side) {
        cylinder(d = ant_top_d, h = ant_top_t, $fn = 48);
        cylinder(d = ant_thread_d, h = ant_jack_above, $fn = 48);
    }
}
module antenna_bulkhead_under_ref(side) {
    // D-flat body through the panel and below, and the nut/shoulder on the inner face.
    at_station(side) {
        translate([0, 0, -ant_panel_t - ant_jack_below]) intersection() {
            cylinder(d = ant_thread_d - 0.2, h = ant_panel_t + ant_jack_below, $fn = 48);
            translate([-ant_thread_d, -(ant_dhole_flat - 0.2) / 2, 0])
                cube([2 * ant_thread_d, ant_dhole_flat - 0.2, ant_panel_t + ant_jack_below]);
        }
        translate([0, 0, -ant_panel_t - ant_nut_t])
            cylinder(d = ant_nut_af / cos(30), h = ant_nut_t, $fn = 6);
    }
}
module antenna_bulkhead_ref(side) { antenna_bulkhead_top_ref(side); antenna_bulkhead_under_ref(side); }
module antenna_pigtail_ref(side) {
    // Leaves the jack, turns +Y (inboard) on ant_cable_bend_r and runs to the station edge.
    z0 = -ant_panel_t - ant_jack_below;
    r = ant_cable_bend_r;
    at_station(side) {
        for (a = [0:15:75]) hull() for (b = [a, a + 15])
            translate([0, r - r * cos(b), z0 - r * sin(b)]) sphere(d = ant_cable_d, $fn = 16);
        hull() for (y = [r, ant_keepout_d / 2 - ant_cable_d / 2 - 0.1])
            translate([0, y, z0 - r]) sphere(d = ant_cable_d, $fn = 16);
    }
}
module antenna_ref(side, tube_d = ant_tube_d_mm, env = false) {
    at_station(side) {
        if (env) cylinder(d = ant_env_d, h = ant_top_z(), $fn = 64);
        else {
            translate([0, 0, ant_base_z()]) cylinder(d = ant_coupling_d, h = ant_coupling_len, $fn = 48);
            translate([0, 0, ant_tube_z0()]) cylinder(d = tube_d, h = ant_tube_len, $fn = 96);
            translate([0, 0, ant_tube_z0() + ant_tube_len])
                cylinder(d = min(ant_radome_d, tube_d),
                         h = ant_top_z() - ant_tube_z0() - ant_tube_len, $fn = 48);
        }
    }
}
// Both stations' purchased and printed hardware above and under the closed lid (views).
module antenna_lid_hardware(d = ant_tube_d_mm, antenna_len = 0) {
    for (s = [-1, 1]) {
        color([0.16, 0.55, 0.60]) {
            antenna_post_placed(s);
            for (i = [0, 1]) antenna_grip_placed(i, s, d);
        }
        color([0.75, 0.76, 0.78]) antenna_bulkhead_ref(s);
        color([0.1, 0.1, 0.1]) antenna_pigtail_ref(s);
        // antenna_len > 0 draws only the lower antenna_len of each antenna. Preview paints any
        // clip face that is coplanar with a visible surface over it (z-fighting stripes), so the
        // clip starts 1 mm inside the lid, and it is a coaxial cylinder whose facets (radius d,
        // the tube OD, around every segment) lie away from the posts' flat faces.
        color([0.92, 0.70, 0.25, 0.55]) {
            if (antenna_len > 0) intersection() {
                antenna_ref(s, d);
                translate([s * ant_ax, ant_ay, ant_lid_top() - 1])
                    cylinder(r = d, h = antenna_len + 1, $fn = 30);
            } else antenna_ref(s, d);
        }
    }
}

if (antenna_part == "grip") antenna_grip();
else if (antenna_part == "post") antenna_post_print(post_side);
else if (antenna_part == "keepout") antenna_lid_keepout();
else assert(false, "antenna_part: grip | post | keepout");
